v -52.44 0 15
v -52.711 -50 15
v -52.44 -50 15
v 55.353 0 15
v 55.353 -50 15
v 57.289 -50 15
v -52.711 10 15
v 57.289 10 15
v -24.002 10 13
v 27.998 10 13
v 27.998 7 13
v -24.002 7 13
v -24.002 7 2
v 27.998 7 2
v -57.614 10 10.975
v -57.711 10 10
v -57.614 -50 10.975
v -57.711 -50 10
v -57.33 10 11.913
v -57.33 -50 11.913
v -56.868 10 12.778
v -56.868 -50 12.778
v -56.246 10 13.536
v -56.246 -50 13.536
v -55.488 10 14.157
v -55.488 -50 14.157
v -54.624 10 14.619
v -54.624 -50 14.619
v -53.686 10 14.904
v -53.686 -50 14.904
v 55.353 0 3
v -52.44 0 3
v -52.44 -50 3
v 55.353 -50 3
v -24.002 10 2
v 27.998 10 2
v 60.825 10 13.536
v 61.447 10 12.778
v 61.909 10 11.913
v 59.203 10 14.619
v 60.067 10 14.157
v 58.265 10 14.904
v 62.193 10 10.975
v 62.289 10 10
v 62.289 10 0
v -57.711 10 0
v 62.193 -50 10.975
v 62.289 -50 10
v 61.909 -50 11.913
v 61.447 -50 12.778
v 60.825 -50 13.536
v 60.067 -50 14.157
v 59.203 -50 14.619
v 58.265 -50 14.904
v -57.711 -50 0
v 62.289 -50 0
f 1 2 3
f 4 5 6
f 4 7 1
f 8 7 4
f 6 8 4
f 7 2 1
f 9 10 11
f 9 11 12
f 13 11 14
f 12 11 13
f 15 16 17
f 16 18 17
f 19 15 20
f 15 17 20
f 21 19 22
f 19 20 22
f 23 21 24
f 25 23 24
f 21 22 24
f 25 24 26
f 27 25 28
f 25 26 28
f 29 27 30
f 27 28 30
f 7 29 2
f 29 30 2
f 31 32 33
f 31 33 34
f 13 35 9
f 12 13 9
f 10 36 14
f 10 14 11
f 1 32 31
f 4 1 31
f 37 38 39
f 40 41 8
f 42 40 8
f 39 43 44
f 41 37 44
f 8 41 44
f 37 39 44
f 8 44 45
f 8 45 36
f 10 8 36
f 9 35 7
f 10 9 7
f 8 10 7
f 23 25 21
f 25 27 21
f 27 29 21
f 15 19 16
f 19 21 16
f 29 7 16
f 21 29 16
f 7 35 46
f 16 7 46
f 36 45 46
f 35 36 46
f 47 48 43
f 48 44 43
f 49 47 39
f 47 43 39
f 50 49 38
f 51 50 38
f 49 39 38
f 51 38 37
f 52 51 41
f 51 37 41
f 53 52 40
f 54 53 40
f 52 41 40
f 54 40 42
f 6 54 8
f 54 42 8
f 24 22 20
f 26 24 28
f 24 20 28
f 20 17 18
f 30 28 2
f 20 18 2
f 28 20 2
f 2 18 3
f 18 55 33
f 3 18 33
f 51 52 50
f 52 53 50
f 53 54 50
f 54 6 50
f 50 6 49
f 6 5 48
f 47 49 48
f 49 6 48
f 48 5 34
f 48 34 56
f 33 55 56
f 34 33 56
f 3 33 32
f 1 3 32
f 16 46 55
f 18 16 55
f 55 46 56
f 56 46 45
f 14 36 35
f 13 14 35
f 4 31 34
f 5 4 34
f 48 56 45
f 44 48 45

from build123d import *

# Parameters (mm, degrees)
F0_W     = 107.7930156246
F0_H     = 50
F1_DEPTH = 3
F2_DEPTH = 15
F3_R     = 5
F3_2_R   = 5
F5_W     = 52
F5_H     = 11
F6_DEPTH = 3


with BuildPart() as f1:
    # F0 (on Top) → F1 (new body)
    with BuildSketch(Plane.XY):
        Polygon((-57.7105433475, 0), (-57.7105433475, -50), (-52.4395332623, -50), (-52.4395332623, 0), (55.3534823623, 0), (55.3534823623, -50), (62.2894566525, -50), (62.2894566525, 0), (62.2894566525, 10), (-57.7105433475, 10), align=None)
        with Locations((1.45697455, -25)):
            Rectangle(F0_W, F0_H)
    extrude(amount=F1_DEPTH)

    # F3#2
    f3_2_edges = [f1.edges().sort_by_distance(p)[0] for p in [
        (-57.710543, -50, 1.5),
        (62.289457, -50, 1.5),
    ]]
    fillet(f3_2_edges, radius=F3_2_R)


with BuildPart() as f2:
    # F0 (on Top) → F2 (new body)
    with BuildSketch(Plane.XY):
        Polygon((-57.7105433475, 0), (-57.7105433475, -50), (-52.4395332623, -50), (-52.4395332623, 0), (55.3534823623, 0), (55.3534823623, -50), (62.2894566525, -50), (62.2894566525, 0), (62.2894566525, 10), (-57.7105433475, 10), align=None)
    extrude(amount=F2_DEPTH)

    # F3
    f3_edges = [f2.edges().sort_by_distance(p)[0] for p in [
        (-57.710543, -20, 15),
        (62.289457, -20, 15),
    ]]
    fillet(f3_edges, radius=F3_R)


with BuildPart() as f1_1:
    add(f1.part)

    # F4: union F2
    add(f2.part)

    # F5 (on face) → F6 (cut)
    with BuildSketch(Plane(origin=(0, 10, 0), x_dir=(-1, 0, 0), z_dir=(0, 1, 0))):
        with Locations((-1.9977902994, 7.5)):
            Rectangle(F5_W, F5_H)
    extrude(amount=-F6_DEPTH, mode=Mode.SUBTRACT)


solid = f1_1.part
